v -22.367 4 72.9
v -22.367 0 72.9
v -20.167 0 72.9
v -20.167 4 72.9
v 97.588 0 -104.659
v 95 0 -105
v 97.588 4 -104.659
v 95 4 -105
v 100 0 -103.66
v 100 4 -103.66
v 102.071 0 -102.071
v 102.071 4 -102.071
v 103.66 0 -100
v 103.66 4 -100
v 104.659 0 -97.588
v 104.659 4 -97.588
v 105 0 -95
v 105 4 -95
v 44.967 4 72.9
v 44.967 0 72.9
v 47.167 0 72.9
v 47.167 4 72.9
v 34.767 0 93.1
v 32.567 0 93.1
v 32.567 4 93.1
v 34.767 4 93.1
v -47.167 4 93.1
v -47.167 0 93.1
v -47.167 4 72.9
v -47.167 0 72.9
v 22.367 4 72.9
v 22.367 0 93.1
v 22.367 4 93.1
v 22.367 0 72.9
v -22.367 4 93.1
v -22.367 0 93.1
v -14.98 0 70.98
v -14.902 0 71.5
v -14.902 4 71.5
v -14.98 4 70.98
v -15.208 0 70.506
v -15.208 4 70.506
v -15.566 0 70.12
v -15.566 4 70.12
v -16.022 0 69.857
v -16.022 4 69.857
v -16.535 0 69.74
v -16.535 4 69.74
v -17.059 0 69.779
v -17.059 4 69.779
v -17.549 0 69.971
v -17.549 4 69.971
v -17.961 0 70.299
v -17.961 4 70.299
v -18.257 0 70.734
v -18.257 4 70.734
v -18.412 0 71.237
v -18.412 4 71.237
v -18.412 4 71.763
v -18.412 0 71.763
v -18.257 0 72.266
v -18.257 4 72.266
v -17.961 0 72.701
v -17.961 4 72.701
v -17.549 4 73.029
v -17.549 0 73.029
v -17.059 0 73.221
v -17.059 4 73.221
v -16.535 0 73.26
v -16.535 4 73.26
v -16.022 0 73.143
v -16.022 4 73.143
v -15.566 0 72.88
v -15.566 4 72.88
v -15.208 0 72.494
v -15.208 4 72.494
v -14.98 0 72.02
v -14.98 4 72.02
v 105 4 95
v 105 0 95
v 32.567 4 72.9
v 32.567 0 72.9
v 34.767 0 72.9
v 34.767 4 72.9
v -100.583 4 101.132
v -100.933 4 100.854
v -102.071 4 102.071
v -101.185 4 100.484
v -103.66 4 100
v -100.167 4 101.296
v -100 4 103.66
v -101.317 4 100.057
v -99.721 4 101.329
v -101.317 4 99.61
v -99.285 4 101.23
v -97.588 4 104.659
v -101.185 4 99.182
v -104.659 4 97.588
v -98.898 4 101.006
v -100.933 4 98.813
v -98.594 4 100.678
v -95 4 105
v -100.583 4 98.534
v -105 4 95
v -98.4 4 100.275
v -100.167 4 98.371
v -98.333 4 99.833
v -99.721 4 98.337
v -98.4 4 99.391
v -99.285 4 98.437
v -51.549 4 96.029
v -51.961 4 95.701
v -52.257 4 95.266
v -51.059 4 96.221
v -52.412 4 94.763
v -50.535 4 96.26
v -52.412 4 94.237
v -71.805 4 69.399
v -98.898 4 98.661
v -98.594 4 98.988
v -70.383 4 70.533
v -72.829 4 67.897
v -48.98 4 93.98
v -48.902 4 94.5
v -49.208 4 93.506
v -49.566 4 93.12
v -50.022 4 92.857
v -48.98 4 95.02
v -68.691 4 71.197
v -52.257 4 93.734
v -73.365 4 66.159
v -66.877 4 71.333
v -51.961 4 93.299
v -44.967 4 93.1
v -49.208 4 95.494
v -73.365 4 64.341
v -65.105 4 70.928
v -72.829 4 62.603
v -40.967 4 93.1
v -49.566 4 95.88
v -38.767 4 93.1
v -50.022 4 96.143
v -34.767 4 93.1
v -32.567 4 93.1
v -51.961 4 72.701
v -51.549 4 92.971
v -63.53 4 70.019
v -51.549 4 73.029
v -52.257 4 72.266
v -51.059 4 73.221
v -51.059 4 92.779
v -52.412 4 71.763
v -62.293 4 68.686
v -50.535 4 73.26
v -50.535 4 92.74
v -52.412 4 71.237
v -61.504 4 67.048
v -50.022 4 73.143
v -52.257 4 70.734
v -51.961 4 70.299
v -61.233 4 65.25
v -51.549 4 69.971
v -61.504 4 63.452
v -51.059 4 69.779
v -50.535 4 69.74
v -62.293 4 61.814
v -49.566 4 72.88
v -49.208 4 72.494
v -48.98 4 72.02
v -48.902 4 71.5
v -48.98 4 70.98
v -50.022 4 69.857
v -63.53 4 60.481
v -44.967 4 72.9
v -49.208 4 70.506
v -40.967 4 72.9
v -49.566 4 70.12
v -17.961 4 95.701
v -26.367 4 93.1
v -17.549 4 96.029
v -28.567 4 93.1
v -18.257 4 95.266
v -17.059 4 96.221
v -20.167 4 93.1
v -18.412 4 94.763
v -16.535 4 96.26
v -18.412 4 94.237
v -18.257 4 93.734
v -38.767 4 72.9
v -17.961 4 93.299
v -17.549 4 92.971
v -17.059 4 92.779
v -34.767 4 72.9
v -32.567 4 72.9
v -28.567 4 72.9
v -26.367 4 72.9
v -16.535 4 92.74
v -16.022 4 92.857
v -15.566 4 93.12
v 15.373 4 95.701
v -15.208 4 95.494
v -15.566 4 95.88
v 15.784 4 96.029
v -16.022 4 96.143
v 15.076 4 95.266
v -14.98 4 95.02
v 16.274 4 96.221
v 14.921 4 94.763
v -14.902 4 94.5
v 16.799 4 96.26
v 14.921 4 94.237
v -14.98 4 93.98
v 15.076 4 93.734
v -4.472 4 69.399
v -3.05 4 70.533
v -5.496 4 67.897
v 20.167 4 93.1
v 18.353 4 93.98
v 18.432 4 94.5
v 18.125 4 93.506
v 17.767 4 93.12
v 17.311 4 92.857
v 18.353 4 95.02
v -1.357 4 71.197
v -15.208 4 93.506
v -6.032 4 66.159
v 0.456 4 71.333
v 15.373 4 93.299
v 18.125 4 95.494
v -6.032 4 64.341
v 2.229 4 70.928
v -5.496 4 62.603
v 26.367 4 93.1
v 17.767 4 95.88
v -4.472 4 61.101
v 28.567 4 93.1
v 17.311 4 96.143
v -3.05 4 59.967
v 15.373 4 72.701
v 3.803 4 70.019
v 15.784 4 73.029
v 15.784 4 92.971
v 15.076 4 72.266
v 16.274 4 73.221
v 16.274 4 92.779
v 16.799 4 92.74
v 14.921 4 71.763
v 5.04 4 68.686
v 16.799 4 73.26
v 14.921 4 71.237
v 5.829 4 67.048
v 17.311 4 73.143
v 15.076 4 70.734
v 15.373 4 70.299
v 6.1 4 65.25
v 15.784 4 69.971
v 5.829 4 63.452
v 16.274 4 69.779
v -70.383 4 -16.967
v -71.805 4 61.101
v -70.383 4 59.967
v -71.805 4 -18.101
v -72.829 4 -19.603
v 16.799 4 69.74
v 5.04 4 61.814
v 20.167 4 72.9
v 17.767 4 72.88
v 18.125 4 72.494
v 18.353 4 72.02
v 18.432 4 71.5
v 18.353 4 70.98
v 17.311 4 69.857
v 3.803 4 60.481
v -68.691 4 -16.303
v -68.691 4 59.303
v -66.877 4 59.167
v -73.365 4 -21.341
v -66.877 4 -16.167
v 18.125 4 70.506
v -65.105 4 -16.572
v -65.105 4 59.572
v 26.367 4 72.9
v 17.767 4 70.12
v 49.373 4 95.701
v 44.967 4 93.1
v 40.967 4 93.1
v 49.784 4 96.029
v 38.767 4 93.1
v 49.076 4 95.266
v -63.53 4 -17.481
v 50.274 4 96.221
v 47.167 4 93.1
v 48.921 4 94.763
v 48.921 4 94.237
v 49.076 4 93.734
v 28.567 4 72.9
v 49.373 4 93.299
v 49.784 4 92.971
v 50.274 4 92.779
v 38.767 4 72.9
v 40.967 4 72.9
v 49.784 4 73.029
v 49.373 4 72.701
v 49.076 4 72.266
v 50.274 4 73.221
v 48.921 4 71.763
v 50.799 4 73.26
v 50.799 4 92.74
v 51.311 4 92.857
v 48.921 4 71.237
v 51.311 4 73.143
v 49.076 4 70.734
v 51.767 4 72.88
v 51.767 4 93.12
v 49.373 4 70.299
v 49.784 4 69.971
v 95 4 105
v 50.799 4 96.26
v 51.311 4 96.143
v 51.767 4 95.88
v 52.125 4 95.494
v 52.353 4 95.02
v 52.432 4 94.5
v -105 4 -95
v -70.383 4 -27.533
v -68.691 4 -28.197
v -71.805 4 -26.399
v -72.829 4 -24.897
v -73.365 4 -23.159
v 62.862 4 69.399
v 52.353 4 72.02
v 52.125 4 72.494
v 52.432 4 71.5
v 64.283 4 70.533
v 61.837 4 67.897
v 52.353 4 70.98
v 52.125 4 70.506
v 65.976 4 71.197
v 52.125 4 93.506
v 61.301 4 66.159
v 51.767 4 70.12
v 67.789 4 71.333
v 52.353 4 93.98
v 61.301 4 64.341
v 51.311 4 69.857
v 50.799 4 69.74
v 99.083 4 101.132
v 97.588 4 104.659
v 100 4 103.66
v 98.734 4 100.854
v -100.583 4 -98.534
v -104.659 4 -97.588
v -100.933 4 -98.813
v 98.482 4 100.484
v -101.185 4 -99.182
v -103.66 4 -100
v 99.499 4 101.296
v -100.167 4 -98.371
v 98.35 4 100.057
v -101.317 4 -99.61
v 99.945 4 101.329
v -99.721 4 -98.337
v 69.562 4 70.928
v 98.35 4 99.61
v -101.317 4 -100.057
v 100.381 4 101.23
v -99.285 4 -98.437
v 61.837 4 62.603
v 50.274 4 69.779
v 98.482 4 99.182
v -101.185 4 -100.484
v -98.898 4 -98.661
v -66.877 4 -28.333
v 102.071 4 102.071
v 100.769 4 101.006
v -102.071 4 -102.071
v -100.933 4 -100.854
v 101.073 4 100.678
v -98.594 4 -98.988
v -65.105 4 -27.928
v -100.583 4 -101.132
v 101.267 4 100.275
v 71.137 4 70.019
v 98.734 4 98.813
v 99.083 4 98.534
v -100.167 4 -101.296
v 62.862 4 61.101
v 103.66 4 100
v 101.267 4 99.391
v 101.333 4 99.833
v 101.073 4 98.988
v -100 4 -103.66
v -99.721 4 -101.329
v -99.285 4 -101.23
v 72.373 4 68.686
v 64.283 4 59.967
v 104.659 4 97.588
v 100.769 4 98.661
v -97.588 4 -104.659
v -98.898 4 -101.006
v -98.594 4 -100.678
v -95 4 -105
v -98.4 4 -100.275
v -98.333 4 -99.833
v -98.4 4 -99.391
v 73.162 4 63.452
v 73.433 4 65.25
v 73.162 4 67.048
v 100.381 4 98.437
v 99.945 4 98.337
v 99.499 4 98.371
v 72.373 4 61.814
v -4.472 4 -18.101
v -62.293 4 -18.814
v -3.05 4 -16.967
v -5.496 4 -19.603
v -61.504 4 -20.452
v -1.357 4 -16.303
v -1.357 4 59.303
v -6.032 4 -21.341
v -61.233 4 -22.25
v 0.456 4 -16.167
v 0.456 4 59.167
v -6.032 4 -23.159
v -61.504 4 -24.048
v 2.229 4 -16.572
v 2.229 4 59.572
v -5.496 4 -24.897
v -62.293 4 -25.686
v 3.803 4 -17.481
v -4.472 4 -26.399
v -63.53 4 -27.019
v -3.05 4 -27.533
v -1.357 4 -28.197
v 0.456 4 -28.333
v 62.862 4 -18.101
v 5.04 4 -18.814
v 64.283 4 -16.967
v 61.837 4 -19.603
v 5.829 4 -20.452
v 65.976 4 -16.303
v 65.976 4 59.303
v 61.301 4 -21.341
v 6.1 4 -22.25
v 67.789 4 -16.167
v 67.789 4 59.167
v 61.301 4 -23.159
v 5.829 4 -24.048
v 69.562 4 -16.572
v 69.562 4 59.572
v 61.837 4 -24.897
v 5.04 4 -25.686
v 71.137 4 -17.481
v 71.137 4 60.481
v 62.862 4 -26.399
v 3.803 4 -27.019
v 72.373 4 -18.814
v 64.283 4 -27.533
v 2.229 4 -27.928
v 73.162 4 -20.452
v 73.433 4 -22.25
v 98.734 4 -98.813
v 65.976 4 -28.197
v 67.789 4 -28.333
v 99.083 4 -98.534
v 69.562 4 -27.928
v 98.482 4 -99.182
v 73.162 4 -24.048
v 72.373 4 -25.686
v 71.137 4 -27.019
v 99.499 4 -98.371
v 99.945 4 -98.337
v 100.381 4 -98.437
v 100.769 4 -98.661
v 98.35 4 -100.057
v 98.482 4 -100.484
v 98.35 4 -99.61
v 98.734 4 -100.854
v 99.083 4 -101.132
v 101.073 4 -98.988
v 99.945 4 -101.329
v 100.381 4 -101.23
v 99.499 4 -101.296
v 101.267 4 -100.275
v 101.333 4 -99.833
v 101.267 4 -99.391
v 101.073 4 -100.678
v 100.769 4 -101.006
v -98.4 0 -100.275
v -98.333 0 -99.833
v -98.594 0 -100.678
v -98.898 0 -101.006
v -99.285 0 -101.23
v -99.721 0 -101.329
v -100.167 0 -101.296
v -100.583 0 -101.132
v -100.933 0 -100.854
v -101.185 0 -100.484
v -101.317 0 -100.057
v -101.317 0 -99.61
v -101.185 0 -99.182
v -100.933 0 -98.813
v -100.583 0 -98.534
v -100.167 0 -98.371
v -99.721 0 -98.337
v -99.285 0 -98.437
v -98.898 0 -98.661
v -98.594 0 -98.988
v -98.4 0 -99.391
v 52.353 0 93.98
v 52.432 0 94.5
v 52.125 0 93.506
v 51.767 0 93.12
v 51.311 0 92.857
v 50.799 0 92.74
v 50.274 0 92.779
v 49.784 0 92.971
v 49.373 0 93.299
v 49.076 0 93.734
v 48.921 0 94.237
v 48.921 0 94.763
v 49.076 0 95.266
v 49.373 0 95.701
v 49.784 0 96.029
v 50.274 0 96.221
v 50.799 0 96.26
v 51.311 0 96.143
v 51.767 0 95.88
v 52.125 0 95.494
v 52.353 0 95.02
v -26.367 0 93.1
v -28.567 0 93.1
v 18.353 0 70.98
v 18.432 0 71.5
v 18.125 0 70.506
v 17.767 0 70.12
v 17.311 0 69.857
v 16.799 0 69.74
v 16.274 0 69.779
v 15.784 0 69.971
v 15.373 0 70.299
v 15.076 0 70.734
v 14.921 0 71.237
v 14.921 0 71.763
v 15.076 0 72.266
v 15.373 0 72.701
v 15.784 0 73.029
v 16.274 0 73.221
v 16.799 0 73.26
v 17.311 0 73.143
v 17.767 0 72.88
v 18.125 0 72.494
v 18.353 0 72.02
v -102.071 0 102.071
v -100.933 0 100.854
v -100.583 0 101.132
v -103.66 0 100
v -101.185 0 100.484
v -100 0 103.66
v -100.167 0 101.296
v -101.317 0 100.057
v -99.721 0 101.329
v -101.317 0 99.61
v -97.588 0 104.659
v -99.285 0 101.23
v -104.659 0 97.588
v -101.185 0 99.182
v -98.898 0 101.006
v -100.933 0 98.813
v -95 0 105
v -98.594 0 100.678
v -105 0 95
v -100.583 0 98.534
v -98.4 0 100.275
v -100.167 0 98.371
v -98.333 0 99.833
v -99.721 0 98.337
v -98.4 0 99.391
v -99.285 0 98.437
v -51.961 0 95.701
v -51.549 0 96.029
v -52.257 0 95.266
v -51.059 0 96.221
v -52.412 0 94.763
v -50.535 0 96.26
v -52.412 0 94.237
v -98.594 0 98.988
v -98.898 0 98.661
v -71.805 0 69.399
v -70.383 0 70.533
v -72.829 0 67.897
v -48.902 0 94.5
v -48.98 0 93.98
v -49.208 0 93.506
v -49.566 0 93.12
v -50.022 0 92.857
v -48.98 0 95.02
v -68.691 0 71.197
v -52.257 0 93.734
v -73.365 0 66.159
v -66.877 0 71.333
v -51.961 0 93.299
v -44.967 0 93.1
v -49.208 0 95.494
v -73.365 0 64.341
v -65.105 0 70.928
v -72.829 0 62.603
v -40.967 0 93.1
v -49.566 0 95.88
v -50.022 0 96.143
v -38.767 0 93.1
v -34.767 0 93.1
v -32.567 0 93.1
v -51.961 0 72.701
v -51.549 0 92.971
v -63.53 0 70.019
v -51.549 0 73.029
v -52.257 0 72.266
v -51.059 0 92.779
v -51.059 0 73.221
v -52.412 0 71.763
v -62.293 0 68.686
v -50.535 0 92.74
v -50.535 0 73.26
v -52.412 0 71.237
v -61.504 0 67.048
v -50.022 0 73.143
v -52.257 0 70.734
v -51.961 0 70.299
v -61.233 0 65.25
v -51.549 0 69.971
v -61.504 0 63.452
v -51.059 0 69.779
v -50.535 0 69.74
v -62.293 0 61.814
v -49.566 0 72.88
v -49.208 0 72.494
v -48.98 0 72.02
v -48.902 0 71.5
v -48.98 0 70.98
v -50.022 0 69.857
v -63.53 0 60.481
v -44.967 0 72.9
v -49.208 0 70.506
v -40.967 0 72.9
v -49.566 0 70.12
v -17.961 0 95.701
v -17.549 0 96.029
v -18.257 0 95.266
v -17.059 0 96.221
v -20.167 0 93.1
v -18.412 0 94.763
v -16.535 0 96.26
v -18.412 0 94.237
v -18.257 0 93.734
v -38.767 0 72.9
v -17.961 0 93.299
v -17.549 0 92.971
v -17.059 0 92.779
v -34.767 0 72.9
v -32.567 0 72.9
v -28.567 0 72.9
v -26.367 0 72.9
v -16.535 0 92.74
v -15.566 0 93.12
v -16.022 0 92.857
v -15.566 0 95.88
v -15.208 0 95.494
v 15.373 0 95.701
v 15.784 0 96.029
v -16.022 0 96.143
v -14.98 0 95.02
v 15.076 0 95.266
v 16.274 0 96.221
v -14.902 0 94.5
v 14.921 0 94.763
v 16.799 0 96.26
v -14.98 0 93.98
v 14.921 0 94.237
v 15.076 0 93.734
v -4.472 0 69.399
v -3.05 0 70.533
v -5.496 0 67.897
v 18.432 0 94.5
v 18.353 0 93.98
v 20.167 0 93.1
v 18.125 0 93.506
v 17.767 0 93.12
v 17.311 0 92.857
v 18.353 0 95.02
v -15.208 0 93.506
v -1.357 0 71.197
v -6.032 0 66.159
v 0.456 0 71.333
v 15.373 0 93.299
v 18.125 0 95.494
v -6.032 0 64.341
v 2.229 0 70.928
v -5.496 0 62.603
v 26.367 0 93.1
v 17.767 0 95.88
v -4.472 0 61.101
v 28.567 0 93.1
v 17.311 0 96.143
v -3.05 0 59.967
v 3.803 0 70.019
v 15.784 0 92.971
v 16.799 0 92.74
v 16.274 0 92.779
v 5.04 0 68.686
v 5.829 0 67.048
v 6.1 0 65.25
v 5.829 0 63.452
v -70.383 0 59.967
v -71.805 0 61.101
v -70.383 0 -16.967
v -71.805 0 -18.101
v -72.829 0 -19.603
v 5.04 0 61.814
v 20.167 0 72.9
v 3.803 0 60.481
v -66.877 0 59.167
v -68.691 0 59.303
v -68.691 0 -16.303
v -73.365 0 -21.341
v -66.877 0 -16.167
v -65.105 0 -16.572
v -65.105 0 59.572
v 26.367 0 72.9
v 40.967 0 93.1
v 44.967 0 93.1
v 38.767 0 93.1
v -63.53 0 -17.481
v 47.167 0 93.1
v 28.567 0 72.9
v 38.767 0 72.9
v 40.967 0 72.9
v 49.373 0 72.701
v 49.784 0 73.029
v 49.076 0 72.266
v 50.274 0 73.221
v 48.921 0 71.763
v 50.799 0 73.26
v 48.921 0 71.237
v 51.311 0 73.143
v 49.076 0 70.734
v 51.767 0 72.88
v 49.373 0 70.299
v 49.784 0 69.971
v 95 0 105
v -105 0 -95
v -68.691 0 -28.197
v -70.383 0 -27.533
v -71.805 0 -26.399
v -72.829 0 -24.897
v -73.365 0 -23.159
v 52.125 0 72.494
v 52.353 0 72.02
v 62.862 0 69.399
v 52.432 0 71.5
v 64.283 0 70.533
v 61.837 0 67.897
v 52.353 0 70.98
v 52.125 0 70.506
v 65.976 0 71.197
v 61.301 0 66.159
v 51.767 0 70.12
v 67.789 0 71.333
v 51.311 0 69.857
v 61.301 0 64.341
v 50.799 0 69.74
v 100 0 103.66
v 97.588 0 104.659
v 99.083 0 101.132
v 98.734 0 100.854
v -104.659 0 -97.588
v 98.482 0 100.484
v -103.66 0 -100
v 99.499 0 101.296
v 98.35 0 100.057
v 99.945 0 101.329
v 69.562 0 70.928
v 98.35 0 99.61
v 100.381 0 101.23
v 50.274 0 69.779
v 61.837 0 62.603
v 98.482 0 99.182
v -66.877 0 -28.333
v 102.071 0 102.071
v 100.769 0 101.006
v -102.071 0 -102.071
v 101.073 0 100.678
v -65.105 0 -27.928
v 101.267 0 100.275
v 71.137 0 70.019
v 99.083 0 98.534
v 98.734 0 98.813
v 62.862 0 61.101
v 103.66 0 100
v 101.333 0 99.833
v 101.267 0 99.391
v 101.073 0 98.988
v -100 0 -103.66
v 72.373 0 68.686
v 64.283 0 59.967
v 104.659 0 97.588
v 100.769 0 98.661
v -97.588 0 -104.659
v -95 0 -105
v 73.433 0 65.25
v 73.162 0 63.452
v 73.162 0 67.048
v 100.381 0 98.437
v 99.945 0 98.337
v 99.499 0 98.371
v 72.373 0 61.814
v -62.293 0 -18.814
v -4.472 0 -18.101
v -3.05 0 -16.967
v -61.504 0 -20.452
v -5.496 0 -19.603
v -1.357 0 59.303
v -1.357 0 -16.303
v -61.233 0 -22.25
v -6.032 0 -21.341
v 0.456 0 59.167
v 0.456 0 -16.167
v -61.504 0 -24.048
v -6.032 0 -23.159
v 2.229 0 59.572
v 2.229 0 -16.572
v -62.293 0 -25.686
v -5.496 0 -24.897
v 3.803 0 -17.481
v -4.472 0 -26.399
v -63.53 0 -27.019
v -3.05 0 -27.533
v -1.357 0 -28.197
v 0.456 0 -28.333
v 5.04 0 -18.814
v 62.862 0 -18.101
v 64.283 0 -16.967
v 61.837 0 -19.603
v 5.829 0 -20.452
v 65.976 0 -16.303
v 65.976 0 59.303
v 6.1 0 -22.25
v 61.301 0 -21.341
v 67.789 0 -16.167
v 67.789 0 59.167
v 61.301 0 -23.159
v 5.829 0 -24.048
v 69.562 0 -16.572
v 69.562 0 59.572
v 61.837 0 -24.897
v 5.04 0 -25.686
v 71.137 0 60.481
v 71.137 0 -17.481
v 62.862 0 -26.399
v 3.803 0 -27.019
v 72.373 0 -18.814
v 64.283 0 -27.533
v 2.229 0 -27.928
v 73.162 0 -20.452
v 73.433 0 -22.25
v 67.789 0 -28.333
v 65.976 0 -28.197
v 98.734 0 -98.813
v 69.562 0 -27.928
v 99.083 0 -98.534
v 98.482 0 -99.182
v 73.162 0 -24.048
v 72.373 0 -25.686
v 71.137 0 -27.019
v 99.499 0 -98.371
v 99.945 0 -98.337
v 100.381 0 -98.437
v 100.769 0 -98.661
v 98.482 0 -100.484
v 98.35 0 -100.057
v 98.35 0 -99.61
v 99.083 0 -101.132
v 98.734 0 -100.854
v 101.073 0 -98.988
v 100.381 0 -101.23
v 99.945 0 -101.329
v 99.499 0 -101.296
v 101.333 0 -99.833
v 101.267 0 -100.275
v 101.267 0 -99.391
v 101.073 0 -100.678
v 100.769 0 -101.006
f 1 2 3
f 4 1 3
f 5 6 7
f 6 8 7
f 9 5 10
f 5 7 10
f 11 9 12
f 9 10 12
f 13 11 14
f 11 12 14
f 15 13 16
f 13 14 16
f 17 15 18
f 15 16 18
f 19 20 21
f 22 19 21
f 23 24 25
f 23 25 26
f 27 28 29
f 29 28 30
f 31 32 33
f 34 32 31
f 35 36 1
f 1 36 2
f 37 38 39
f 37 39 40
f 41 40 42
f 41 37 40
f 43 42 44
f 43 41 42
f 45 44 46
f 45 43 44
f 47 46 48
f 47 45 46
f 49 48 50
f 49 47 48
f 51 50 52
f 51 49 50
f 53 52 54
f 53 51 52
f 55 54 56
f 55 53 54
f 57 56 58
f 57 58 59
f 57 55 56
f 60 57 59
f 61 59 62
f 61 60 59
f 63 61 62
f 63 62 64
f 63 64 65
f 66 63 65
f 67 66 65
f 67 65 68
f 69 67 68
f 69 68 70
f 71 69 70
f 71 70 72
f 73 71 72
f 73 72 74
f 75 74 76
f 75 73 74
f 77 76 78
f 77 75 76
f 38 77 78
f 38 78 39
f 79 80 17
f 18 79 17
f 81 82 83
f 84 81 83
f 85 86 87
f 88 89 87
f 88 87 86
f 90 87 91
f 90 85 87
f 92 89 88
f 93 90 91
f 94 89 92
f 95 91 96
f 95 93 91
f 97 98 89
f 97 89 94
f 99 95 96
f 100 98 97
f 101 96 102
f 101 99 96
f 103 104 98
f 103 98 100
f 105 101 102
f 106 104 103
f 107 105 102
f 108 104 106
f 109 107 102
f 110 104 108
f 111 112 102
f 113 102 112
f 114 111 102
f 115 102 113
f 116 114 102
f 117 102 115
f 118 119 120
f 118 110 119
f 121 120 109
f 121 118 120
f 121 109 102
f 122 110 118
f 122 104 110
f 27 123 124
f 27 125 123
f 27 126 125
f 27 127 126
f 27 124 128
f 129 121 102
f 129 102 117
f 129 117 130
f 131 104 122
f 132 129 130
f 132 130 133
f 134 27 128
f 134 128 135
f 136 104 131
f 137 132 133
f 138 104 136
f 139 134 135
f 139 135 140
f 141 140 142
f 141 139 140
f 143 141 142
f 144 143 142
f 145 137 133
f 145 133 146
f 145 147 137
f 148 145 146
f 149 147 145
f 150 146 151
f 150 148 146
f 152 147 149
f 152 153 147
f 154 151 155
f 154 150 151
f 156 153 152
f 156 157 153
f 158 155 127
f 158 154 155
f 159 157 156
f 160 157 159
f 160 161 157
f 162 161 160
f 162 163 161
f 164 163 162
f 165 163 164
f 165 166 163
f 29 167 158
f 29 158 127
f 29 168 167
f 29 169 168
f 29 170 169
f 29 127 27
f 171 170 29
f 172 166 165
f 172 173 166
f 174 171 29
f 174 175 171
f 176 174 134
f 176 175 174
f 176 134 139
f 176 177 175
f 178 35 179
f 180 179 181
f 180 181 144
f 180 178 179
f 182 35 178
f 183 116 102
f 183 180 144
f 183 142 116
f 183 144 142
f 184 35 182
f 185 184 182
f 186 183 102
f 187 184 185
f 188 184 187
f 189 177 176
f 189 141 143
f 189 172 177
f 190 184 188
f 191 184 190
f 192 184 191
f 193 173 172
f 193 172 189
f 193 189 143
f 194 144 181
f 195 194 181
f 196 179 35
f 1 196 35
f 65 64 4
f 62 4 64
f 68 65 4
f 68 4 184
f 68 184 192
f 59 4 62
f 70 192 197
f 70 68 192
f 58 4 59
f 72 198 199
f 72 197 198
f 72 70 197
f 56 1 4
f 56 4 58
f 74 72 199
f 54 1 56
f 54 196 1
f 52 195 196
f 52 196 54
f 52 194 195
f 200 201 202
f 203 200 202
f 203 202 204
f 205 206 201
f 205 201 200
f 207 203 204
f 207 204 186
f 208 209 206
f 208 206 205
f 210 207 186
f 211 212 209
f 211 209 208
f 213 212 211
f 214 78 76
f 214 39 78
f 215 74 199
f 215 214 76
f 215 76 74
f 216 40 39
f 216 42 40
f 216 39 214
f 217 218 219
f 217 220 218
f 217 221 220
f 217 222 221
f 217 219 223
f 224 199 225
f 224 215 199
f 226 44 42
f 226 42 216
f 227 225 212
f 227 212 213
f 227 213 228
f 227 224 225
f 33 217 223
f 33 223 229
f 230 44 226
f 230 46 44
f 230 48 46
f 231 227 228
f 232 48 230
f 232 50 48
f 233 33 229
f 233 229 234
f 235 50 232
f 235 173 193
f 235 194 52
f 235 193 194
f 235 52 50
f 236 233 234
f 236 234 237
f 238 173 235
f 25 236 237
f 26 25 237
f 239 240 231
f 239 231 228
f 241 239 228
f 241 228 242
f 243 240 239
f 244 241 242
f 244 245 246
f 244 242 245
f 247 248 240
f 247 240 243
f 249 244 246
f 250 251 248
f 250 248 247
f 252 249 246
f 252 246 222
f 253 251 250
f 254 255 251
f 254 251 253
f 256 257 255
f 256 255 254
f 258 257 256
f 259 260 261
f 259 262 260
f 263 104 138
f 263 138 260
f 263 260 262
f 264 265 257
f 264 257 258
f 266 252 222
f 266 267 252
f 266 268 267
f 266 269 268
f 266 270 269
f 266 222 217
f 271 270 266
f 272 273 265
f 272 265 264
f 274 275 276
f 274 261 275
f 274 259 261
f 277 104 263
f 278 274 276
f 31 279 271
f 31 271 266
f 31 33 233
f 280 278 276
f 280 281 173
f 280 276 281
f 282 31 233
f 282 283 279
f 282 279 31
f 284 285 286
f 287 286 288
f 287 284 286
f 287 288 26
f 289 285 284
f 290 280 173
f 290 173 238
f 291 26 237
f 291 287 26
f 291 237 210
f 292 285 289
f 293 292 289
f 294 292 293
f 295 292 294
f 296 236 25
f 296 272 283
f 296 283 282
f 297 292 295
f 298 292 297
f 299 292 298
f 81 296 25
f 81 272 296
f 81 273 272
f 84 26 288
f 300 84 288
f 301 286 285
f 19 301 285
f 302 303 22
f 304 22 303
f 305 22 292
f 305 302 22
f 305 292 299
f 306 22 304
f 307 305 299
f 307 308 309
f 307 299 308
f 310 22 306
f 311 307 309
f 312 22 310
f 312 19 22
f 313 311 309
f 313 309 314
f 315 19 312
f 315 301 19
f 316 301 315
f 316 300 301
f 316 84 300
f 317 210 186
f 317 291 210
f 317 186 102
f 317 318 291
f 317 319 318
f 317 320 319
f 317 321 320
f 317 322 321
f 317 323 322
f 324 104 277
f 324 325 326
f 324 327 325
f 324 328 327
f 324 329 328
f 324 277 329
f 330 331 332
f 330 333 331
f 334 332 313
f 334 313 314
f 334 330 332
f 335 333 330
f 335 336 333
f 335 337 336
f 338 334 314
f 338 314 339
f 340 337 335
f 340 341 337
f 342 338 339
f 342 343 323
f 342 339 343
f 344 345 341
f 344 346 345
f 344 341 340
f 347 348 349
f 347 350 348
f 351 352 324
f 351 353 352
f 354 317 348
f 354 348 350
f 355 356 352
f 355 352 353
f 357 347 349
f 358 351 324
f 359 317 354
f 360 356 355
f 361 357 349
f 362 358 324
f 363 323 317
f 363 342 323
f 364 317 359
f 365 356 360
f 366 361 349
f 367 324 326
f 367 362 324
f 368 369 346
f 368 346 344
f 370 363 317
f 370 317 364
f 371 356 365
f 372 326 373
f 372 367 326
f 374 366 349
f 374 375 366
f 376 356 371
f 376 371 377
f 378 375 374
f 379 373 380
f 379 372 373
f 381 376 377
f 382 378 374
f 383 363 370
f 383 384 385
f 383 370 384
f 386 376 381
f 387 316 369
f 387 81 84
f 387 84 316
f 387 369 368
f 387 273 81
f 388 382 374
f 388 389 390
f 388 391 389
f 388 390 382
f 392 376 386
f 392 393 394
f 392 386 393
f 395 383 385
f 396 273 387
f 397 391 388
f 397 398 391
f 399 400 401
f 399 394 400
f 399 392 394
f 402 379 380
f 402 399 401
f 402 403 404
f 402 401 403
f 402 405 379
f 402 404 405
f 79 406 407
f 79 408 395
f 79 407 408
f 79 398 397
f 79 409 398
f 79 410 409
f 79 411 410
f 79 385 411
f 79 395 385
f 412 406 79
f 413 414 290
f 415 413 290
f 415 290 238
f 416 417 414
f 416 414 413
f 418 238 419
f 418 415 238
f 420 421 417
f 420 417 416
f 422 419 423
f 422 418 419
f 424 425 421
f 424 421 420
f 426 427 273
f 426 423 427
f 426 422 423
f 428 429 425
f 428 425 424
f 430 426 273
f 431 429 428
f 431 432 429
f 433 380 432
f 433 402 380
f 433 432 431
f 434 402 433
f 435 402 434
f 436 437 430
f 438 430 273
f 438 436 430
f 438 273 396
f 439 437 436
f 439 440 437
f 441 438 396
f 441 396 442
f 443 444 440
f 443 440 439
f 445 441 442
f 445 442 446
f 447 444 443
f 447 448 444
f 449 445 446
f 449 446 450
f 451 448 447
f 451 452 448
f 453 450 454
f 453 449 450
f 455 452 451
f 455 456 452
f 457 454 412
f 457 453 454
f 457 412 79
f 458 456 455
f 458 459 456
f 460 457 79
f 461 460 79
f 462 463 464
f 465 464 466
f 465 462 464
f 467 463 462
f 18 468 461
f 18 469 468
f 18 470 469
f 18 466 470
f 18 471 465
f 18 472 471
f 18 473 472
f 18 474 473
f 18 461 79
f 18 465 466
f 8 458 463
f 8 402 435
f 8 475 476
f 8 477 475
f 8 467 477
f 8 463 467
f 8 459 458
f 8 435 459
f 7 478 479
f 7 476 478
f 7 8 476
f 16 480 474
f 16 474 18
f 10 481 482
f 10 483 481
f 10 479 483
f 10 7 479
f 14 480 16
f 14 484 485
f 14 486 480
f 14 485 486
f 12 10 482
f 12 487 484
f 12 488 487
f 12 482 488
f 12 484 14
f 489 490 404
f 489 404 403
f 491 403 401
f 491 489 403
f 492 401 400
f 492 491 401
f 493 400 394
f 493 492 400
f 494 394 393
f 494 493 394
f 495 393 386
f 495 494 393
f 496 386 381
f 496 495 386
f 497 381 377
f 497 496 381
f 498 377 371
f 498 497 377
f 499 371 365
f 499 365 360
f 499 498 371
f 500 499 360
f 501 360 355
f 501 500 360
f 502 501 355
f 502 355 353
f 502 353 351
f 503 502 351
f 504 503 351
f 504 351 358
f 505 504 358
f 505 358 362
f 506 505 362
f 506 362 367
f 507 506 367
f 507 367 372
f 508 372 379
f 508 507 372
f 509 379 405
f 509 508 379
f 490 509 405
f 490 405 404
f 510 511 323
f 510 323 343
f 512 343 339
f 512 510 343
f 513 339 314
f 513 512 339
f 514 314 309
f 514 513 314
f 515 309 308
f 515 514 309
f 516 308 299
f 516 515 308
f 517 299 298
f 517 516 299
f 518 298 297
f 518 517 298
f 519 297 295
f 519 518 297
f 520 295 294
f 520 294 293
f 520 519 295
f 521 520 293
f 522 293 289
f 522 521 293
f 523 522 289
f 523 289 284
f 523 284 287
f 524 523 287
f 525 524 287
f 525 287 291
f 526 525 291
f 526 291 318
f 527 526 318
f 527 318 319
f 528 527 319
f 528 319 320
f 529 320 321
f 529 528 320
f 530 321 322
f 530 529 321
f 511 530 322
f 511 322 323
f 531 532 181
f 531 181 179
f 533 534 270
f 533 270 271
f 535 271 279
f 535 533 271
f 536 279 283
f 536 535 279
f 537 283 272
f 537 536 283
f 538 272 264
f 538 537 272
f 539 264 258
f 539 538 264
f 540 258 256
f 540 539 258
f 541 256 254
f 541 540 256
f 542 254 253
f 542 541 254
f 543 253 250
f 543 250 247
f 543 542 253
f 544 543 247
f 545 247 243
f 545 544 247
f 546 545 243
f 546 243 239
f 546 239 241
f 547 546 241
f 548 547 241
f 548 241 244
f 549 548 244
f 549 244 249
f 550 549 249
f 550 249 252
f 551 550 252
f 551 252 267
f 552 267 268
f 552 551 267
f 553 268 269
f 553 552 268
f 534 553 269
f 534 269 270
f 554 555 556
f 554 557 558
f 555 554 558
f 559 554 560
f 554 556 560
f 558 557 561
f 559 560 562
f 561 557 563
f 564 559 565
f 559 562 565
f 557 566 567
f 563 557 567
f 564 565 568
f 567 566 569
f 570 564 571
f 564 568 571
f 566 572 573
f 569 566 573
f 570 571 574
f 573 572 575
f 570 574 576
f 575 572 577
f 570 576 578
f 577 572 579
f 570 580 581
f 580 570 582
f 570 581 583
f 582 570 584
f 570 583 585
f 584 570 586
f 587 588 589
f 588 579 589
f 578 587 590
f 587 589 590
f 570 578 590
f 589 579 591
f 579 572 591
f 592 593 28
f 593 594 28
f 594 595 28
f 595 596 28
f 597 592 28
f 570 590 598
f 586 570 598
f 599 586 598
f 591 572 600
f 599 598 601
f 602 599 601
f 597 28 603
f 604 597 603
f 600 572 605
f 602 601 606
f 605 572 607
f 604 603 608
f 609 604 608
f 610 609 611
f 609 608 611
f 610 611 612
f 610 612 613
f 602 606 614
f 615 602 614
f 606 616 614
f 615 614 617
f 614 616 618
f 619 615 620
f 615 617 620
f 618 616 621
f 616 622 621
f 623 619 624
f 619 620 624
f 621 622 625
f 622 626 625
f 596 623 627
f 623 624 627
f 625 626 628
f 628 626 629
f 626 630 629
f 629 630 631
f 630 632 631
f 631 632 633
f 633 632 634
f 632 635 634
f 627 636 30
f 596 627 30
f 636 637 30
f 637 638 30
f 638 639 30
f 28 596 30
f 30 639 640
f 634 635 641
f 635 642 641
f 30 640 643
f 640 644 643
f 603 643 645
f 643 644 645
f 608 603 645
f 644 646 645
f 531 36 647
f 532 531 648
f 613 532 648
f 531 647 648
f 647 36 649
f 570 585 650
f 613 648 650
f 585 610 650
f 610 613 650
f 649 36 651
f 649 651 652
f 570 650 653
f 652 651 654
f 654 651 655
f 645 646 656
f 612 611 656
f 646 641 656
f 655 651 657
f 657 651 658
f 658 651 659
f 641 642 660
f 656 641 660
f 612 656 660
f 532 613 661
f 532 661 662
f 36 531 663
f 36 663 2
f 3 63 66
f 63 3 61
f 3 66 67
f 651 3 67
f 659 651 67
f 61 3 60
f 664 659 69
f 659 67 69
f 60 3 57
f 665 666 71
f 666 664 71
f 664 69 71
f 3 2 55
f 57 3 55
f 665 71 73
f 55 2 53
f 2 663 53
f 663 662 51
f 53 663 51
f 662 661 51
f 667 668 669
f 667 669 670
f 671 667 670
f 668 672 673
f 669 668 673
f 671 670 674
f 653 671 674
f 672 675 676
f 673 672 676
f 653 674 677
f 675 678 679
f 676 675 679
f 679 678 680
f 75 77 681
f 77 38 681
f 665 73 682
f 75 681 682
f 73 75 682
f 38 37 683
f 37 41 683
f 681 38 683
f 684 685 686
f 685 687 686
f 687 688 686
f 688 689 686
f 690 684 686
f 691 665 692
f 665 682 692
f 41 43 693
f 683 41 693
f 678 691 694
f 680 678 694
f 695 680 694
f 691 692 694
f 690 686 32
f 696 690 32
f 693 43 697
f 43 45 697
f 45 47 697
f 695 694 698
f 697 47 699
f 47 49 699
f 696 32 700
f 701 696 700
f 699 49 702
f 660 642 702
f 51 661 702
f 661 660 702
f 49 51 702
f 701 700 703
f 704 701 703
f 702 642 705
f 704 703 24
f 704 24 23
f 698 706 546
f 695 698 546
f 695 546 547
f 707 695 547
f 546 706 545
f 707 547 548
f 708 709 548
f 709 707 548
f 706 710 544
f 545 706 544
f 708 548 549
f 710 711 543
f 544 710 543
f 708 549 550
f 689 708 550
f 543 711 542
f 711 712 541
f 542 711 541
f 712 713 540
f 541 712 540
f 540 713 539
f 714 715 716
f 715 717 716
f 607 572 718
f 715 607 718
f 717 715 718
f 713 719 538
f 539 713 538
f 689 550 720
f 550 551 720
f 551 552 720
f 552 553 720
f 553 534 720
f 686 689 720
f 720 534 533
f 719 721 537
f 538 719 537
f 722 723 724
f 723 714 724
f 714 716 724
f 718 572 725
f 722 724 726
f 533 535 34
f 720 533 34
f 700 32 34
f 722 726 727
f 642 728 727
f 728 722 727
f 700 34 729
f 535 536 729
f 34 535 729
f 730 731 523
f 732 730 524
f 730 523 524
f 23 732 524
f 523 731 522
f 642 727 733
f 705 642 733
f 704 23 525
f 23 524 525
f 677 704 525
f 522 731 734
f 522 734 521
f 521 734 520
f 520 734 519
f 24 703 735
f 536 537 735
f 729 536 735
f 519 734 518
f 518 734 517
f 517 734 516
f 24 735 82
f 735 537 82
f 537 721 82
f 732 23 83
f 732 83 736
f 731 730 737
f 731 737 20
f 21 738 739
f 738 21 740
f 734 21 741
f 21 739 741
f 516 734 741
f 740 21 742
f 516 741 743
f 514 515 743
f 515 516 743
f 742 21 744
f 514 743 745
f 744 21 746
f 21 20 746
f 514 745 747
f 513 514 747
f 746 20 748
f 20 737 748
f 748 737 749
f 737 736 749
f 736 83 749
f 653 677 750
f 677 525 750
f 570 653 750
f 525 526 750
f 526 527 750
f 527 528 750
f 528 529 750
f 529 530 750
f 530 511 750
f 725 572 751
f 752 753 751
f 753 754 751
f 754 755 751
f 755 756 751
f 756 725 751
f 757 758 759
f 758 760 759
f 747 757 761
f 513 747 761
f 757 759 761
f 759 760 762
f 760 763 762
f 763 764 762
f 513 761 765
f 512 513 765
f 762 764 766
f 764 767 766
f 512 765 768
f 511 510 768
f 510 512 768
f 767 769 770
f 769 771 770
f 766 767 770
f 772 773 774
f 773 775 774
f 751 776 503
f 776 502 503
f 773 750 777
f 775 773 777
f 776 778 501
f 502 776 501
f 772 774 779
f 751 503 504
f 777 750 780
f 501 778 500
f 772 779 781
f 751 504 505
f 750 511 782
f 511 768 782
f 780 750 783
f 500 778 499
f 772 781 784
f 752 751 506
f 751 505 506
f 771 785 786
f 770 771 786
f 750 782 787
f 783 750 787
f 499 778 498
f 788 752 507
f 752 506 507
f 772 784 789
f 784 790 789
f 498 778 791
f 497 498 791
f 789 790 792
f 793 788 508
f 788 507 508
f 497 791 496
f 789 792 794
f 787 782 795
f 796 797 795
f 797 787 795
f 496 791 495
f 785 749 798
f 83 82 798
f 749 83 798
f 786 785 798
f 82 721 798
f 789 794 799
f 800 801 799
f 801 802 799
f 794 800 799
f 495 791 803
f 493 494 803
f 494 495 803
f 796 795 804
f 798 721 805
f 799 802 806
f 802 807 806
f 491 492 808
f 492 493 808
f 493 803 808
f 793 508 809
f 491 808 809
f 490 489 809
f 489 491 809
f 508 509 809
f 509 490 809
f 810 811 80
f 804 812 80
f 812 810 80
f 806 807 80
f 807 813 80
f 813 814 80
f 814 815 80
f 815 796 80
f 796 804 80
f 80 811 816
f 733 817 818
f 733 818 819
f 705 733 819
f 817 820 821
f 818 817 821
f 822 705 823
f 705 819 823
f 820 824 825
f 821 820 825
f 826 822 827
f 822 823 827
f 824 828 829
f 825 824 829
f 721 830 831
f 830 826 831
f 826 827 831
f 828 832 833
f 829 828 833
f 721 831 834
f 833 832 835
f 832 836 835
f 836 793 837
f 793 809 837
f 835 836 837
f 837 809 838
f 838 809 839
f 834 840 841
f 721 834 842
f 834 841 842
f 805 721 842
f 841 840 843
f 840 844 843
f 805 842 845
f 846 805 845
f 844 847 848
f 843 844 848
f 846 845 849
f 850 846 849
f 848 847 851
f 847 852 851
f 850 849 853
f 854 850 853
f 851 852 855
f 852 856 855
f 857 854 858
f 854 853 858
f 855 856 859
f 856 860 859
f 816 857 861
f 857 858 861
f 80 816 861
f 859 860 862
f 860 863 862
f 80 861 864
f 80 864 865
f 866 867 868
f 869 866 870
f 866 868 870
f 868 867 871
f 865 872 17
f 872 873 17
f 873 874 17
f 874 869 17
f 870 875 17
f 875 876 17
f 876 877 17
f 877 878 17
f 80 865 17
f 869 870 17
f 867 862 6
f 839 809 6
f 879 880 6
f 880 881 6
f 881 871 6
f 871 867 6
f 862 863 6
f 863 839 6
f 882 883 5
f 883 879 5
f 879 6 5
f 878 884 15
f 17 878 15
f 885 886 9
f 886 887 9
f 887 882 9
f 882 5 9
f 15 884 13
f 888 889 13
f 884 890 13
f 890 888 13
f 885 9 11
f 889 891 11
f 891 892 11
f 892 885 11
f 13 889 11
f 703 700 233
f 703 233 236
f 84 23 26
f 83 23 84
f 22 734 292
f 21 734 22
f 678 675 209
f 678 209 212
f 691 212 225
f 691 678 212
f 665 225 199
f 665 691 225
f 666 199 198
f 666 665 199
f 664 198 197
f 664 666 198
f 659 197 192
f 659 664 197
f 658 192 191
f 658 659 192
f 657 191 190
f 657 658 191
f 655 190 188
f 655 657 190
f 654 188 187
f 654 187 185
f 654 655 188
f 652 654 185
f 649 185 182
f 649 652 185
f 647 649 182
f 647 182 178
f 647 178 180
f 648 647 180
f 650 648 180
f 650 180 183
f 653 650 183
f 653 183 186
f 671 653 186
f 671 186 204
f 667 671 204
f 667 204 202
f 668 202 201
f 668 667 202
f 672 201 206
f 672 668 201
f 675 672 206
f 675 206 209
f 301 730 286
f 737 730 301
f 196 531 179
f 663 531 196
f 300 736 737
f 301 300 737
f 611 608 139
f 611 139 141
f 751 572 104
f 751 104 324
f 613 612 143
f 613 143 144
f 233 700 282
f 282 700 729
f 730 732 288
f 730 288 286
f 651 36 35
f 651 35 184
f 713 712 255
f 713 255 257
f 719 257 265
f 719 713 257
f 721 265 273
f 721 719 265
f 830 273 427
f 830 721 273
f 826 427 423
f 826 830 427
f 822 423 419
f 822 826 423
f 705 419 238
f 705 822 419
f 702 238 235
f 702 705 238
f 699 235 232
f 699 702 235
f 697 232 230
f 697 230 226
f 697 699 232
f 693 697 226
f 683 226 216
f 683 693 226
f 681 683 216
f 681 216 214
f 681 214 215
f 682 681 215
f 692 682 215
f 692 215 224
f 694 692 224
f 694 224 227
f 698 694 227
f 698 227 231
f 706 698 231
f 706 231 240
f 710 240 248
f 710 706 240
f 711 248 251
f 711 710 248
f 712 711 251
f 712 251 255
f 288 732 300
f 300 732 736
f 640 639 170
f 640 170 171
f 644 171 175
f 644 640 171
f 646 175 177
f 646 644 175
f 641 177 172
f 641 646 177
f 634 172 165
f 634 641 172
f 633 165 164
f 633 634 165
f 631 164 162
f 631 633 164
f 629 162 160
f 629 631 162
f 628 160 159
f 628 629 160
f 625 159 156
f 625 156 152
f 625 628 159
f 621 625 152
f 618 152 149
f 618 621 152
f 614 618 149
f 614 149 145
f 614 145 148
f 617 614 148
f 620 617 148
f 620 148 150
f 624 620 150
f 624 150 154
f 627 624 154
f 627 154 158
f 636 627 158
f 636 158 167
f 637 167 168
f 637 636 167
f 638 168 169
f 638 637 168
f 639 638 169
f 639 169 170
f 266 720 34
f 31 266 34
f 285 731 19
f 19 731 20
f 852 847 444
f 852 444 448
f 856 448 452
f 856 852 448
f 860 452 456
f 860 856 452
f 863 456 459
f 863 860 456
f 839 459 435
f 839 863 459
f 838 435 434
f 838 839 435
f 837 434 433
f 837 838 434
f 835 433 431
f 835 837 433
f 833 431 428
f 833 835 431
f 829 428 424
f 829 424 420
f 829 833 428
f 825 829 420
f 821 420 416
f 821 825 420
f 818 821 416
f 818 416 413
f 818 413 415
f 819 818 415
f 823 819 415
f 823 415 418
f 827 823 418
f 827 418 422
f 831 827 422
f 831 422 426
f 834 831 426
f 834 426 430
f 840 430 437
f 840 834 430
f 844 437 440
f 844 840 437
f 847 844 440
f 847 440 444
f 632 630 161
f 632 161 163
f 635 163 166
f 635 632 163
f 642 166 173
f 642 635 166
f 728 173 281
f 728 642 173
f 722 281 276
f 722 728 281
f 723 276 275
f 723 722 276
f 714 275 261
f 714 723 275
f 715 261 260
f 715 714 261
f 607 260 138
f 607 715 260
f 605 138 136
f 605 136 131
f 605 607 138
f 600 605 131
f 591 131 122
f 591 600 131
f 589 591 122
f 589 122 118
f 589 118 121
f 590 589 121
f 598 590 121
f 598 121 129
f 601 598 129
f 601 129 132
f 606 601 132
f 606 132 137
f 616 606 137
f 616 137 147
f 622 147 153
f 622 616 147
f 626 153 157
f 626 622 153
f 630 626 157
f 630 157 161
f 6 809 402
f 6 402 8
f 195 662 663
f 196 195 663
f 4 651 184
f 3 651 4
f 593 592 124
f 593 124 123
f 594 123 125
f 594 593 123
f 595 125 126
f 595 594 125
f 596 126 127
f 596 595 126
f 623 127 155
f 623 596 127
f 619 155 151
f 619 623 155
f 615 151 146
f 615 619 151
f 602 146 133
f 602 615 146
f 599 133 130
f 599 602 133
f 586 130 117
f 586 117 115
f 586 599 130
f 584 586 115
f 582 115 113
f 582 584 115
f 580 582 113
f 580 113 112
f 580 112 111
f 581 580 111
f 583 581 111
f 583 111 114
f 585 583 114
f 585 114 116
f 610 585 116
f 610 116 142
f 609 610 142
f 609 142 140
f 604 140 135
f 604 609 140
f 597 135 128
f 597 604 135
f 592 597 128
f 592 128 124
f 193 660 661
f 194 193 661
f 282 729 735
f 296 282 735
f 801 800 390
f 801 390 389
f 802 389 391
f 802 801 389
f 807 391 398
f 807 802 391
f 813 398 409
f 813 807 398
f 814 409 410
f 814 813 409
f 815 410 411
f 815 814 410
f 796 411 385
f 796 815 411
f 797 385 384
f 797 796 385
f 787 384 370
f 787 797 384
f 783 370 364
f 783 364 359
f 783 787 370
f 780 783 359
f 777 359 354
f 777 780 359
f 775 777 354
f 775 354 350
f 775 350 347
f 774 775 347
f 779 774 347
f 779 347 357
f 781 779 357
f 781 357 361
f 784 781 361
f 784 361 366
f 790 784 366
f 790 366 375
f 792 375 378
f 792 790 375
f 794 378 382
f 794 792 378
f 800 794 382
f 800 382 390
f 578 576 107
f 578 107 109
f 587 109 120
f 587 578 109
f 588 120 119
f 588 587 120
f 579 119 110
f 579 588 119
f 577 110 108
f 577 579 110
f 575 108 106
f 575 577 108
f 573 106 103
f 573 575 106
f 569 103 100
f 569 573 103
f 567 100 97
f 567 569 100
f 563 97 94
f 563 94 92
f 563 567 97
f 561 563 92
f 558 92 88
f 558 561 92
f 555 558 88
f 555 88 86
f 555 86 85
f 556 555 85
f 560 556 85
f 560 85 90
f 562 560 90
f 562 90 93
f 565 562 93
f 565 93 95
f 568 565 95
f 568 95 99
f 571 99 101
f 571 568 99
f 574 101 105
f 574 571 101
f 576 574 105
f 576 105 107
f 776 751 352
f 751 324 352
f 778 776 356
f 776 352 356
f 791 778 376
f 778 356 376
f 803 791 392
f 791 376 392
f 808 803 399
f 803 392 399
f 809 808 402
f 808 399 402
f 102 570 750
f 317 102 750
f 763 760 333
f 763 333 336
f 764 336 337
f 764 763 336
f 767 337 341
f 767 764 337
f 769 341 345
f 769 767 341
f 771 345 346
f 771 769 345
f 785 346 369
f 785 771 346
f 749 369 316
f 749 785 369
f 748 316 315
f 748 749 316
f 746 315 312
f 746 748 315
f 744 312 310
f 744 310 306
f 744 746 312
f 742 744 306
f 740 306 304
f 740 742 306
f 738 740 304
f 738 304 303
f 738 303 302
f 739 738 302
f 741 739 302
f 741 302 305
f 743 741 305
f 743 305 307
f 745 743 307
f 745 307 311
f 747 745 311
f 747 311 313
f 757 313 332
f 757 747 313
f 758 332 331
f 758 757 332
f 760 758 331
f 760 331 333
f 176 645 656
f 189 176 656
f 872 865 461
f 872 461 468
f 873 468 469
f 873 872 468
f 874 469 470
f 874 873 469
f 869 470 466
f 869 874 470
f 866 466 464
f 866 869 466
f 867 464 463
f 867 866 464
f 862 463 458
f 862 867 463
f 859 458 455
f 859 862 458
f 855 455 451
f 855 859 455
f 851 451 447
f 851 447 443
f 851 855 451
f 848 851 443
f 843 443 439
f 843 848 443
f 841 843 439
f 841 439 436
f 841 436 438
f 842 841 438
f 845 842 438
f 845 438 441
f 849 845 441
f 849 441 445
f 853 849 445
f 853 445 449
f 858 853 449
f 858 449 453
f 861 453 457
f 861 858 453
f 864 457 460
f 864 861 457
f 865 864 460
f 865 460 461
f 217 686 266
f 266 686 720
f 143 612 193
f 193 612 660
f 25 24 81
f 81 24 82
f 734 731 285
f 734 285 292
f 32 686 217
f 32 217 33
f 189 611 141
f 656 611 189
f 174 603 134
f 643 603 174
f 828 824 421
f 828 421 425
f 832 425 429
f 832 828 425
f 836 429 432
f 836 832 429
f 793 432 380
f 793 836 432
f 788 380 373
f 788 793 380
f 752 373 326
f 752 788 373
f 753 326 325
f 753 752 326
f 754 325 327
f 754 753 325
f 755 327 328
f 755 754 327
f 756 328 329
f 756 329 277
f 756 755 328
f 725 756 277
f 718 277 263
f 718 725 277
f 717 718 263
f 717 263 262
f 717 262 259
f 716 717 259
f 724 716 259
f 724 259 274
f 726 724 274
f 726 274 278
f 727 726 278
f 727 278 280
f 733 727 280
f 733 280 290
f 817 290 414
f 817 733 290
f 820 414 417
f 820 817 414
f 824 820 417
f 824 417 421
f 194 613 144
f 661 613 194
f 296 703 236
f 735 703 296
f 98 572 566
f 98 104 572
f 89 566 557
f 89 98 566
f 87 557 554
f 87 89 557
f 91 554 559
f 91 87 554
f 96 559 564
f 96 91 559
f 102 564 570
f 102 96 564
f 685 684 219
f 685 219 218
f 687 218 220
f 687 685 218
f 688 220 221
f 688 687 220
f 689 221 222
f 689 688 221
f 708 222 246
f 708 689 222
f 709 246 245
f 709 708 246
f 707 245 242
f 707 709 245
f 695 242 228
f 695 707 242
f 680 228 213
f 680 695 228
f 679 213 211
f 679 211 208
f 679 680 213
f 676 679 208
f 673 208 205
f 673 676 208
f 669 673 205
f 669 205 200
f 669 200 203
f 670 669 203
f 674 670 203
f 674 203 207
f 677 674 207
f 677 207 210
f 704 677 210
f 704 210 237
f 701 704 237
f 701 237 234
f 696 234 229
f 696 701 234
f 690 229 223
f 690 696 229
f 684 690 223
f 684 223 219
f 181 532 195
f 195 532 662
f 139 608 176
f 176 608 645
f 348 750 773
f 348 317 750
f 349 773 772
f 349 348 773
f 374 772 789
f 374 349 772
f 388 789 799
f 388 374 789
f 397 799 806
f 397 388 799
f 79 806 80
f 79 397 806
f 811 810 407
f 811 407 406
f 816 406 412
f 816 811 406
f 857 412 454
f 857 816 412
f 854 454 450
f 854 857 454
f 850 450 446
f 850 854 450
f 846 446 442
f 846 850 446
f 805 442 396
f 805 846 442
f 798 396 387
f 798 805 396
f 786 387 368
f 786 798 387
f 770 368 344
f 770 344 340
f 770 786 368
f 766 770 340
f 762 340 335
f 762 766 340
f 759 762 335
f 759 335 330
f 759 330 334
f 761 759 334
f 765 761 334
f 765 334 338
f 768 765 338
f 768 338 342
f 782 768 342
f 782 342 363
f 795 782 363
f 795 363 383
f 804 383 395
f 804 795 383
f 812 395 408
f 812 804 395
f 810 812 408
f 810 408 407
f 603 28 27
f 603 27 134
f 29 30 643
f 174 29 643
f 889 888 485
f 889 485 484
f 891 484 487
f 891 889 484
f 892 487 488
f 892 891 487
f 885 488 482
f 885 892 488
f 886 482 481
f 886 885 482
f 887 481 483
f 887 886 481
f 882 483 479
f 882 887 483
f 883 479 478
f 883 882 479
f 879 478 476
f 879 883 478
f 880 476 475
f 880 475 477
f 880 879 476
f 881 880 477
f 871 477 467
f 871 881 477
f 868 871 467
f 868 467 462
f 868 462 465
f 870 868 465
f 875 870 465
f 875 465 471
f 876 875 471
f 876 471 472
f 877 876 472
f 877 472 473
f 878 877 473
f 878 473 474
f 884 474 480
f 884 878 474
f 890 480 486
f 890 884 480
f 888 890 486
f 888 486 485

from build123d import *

# Parameters (mm, degrees)
SKETCH1_W         = 210
SKETCH1_H         = 210
SKETCH1_R         = 1.5
SKETCH1_R_2       = 6.1
SKETCH1_R_3       = 1.765
SKETCH1_W_2       = 2.2
SKETCH1_H_2       = 20.2
MAINEXTRUDE_DEPTH = 4
ROUNDEDCORNERS_R  = 10


with BuildPart() as part:
    # Sketch1 → MainExtrude (new body)
    with BuildSketch(Plane(origin=(0, 0, 0), x_dir=(1, 0, 0), z_dir=(0, 1, 0))):
        Rectangle(SKETCH1_W, SKETCH1_H)
        with Locations((-99.833273811, 99.833273811)):
            Circle(SKETCH1_R, mode=Mode.SUBTRACT)
        with Locations((-99.833273811, -99.833273811)):
            Circle(SKETCH1_R, mode=Mode.SUBTRACT)
        with Locations((99.833273811, -99.833273811)):
            Circle(SKETCH1_R, mode=Mode.SUBTRACT)
        with Locations((99.833273811, 99.833273811)):
            Circle(SKETCH1_R, mode=Mode.SUBTRACT)
        with Locations((67.333333333, -65.25)):
            Circle(SKETCH1_R_2, mode=Mode.SUBTRACT)
        with Locations((0, -65.25)):
            Circle(SKETCH1_R_2, mode=Mode.SUBTRACT)
        with Locations((-67.333333333, -65.25)):
            Circle(SKETCH1_R_2, mode=Mode.SUBTRACT)
        with Locations((-67.333333333, 22.25)):
            Circle(SKETCH1_R_2, mode=Mode.SUBTRACT)
        with Locations((0, 22.25)):
            Circle(SKETCH1_R_2, mode=Mode.SUBTRACT)
        with Locations((67.333333333, 22.25)):
            Circle(SKETCH1_R_2, mode=Mode.SUBTRACT)
        with Locations((-50.666666667, -71.5)):
            Circle(SKETCH1_R_3, mode=Mode.SUBTRACT)
        with Locations((-50.666666667, -94.5)):
            Circle(SKETCH1_R_3, mode=Mode.SUBTRACT)
        with Locations((-16.666666667, -94.5)):
            Circle(SKETCH1_R_3, mode=Mode.SUBTRACT)
        with Locations((-16.666666667, -71.5)):
            Circle(SKETCH1_R_3, mode=Mode.SUBTRACT)
        with Locations((16.666666667, -71.5)):
            Circle(SKETCH1_R_3, mode=Mode.SUBTRACT)
        with Locations((16.666666667, -94.5)):
            Circle(SKETCH1_R_3, mode=Mode.SUBTRACT)
        with Locations((50.666666667, -94.5)):
            Circle(SKETCH1_R_3, mode=Mode.SUBTRACT)
        with Locations((50.666666667, -71.5)):
            Circle(SKETCH1_R_3, mode=Mode.SUBTRACT)
        with Locations((-46.066666667, -83)):
            Rectangle(SKETCH1_W_2, SKETCH1_H_2, mode=Mode.SUBTRACT)
        with Locations((-39.866666667, -83)):
            Rectangle(SKETCH1_W_2, SKETCH1_H_2, mode=Mode.SUBTRACT)
        with Locations((-33.666666667, -83)):
            Rectangle(SKETCH1_W_2, SKETCH1_H_2, mode=Mode.SUBTRACT)
        with Locations((-27.466666667, -83)):
            Rectangle(SKETCH1_W_2, SKETCH1_H_2, mode=Mode.SUBTRACT)
        with Locations((-21.266666667, -83)):
            Rectangle(SKETCH1_W_2, SKETCH1_H_2, mode=Mode.SUBTRACT)
        with Locations((21.266666667, -83)):
            Rectangle(SKETCH1_W_2, SKETCH1_H_2, mode=Mode.SUBTRACT)
        with Locations((27.466666667, -83)):
            Rectangle(SKETCH1_W_2, SKETCH1_H_2, mode=Mode.SUBTRACT)
        with Locations((33.666666667, -83)):
            Rectangle(SKETCH1_W_2, SKETCH1_H_2, mode=Mode.SUBTRACT)
        with Locations((39.866666667, -83)):
            Rectangle(SKETCH1_W_2, SKETCH1_H_2, mode=Mode.SUBTRACT)
        with Locations((46.066666667, -83)):
            Rectangle(SKETCH1_W_2, SKETCH1_H_2, mode=Mode.SUBTRACT)
    extrude(amount=MAINEXTRUDE_DEPTH)

    # RoundedCorners
    roundedcorners_edges = [part.edges().sort_by_distance(p)[0] for p in [
        (-105, 2, 105),
        (-105, 2, -105),
        (105, 2, -105),
        (105, 2, 105),
    ]]
    fillet(roundedcorners_edges, radius=ROUNDEDCORNERS_R)


solid = part.part
